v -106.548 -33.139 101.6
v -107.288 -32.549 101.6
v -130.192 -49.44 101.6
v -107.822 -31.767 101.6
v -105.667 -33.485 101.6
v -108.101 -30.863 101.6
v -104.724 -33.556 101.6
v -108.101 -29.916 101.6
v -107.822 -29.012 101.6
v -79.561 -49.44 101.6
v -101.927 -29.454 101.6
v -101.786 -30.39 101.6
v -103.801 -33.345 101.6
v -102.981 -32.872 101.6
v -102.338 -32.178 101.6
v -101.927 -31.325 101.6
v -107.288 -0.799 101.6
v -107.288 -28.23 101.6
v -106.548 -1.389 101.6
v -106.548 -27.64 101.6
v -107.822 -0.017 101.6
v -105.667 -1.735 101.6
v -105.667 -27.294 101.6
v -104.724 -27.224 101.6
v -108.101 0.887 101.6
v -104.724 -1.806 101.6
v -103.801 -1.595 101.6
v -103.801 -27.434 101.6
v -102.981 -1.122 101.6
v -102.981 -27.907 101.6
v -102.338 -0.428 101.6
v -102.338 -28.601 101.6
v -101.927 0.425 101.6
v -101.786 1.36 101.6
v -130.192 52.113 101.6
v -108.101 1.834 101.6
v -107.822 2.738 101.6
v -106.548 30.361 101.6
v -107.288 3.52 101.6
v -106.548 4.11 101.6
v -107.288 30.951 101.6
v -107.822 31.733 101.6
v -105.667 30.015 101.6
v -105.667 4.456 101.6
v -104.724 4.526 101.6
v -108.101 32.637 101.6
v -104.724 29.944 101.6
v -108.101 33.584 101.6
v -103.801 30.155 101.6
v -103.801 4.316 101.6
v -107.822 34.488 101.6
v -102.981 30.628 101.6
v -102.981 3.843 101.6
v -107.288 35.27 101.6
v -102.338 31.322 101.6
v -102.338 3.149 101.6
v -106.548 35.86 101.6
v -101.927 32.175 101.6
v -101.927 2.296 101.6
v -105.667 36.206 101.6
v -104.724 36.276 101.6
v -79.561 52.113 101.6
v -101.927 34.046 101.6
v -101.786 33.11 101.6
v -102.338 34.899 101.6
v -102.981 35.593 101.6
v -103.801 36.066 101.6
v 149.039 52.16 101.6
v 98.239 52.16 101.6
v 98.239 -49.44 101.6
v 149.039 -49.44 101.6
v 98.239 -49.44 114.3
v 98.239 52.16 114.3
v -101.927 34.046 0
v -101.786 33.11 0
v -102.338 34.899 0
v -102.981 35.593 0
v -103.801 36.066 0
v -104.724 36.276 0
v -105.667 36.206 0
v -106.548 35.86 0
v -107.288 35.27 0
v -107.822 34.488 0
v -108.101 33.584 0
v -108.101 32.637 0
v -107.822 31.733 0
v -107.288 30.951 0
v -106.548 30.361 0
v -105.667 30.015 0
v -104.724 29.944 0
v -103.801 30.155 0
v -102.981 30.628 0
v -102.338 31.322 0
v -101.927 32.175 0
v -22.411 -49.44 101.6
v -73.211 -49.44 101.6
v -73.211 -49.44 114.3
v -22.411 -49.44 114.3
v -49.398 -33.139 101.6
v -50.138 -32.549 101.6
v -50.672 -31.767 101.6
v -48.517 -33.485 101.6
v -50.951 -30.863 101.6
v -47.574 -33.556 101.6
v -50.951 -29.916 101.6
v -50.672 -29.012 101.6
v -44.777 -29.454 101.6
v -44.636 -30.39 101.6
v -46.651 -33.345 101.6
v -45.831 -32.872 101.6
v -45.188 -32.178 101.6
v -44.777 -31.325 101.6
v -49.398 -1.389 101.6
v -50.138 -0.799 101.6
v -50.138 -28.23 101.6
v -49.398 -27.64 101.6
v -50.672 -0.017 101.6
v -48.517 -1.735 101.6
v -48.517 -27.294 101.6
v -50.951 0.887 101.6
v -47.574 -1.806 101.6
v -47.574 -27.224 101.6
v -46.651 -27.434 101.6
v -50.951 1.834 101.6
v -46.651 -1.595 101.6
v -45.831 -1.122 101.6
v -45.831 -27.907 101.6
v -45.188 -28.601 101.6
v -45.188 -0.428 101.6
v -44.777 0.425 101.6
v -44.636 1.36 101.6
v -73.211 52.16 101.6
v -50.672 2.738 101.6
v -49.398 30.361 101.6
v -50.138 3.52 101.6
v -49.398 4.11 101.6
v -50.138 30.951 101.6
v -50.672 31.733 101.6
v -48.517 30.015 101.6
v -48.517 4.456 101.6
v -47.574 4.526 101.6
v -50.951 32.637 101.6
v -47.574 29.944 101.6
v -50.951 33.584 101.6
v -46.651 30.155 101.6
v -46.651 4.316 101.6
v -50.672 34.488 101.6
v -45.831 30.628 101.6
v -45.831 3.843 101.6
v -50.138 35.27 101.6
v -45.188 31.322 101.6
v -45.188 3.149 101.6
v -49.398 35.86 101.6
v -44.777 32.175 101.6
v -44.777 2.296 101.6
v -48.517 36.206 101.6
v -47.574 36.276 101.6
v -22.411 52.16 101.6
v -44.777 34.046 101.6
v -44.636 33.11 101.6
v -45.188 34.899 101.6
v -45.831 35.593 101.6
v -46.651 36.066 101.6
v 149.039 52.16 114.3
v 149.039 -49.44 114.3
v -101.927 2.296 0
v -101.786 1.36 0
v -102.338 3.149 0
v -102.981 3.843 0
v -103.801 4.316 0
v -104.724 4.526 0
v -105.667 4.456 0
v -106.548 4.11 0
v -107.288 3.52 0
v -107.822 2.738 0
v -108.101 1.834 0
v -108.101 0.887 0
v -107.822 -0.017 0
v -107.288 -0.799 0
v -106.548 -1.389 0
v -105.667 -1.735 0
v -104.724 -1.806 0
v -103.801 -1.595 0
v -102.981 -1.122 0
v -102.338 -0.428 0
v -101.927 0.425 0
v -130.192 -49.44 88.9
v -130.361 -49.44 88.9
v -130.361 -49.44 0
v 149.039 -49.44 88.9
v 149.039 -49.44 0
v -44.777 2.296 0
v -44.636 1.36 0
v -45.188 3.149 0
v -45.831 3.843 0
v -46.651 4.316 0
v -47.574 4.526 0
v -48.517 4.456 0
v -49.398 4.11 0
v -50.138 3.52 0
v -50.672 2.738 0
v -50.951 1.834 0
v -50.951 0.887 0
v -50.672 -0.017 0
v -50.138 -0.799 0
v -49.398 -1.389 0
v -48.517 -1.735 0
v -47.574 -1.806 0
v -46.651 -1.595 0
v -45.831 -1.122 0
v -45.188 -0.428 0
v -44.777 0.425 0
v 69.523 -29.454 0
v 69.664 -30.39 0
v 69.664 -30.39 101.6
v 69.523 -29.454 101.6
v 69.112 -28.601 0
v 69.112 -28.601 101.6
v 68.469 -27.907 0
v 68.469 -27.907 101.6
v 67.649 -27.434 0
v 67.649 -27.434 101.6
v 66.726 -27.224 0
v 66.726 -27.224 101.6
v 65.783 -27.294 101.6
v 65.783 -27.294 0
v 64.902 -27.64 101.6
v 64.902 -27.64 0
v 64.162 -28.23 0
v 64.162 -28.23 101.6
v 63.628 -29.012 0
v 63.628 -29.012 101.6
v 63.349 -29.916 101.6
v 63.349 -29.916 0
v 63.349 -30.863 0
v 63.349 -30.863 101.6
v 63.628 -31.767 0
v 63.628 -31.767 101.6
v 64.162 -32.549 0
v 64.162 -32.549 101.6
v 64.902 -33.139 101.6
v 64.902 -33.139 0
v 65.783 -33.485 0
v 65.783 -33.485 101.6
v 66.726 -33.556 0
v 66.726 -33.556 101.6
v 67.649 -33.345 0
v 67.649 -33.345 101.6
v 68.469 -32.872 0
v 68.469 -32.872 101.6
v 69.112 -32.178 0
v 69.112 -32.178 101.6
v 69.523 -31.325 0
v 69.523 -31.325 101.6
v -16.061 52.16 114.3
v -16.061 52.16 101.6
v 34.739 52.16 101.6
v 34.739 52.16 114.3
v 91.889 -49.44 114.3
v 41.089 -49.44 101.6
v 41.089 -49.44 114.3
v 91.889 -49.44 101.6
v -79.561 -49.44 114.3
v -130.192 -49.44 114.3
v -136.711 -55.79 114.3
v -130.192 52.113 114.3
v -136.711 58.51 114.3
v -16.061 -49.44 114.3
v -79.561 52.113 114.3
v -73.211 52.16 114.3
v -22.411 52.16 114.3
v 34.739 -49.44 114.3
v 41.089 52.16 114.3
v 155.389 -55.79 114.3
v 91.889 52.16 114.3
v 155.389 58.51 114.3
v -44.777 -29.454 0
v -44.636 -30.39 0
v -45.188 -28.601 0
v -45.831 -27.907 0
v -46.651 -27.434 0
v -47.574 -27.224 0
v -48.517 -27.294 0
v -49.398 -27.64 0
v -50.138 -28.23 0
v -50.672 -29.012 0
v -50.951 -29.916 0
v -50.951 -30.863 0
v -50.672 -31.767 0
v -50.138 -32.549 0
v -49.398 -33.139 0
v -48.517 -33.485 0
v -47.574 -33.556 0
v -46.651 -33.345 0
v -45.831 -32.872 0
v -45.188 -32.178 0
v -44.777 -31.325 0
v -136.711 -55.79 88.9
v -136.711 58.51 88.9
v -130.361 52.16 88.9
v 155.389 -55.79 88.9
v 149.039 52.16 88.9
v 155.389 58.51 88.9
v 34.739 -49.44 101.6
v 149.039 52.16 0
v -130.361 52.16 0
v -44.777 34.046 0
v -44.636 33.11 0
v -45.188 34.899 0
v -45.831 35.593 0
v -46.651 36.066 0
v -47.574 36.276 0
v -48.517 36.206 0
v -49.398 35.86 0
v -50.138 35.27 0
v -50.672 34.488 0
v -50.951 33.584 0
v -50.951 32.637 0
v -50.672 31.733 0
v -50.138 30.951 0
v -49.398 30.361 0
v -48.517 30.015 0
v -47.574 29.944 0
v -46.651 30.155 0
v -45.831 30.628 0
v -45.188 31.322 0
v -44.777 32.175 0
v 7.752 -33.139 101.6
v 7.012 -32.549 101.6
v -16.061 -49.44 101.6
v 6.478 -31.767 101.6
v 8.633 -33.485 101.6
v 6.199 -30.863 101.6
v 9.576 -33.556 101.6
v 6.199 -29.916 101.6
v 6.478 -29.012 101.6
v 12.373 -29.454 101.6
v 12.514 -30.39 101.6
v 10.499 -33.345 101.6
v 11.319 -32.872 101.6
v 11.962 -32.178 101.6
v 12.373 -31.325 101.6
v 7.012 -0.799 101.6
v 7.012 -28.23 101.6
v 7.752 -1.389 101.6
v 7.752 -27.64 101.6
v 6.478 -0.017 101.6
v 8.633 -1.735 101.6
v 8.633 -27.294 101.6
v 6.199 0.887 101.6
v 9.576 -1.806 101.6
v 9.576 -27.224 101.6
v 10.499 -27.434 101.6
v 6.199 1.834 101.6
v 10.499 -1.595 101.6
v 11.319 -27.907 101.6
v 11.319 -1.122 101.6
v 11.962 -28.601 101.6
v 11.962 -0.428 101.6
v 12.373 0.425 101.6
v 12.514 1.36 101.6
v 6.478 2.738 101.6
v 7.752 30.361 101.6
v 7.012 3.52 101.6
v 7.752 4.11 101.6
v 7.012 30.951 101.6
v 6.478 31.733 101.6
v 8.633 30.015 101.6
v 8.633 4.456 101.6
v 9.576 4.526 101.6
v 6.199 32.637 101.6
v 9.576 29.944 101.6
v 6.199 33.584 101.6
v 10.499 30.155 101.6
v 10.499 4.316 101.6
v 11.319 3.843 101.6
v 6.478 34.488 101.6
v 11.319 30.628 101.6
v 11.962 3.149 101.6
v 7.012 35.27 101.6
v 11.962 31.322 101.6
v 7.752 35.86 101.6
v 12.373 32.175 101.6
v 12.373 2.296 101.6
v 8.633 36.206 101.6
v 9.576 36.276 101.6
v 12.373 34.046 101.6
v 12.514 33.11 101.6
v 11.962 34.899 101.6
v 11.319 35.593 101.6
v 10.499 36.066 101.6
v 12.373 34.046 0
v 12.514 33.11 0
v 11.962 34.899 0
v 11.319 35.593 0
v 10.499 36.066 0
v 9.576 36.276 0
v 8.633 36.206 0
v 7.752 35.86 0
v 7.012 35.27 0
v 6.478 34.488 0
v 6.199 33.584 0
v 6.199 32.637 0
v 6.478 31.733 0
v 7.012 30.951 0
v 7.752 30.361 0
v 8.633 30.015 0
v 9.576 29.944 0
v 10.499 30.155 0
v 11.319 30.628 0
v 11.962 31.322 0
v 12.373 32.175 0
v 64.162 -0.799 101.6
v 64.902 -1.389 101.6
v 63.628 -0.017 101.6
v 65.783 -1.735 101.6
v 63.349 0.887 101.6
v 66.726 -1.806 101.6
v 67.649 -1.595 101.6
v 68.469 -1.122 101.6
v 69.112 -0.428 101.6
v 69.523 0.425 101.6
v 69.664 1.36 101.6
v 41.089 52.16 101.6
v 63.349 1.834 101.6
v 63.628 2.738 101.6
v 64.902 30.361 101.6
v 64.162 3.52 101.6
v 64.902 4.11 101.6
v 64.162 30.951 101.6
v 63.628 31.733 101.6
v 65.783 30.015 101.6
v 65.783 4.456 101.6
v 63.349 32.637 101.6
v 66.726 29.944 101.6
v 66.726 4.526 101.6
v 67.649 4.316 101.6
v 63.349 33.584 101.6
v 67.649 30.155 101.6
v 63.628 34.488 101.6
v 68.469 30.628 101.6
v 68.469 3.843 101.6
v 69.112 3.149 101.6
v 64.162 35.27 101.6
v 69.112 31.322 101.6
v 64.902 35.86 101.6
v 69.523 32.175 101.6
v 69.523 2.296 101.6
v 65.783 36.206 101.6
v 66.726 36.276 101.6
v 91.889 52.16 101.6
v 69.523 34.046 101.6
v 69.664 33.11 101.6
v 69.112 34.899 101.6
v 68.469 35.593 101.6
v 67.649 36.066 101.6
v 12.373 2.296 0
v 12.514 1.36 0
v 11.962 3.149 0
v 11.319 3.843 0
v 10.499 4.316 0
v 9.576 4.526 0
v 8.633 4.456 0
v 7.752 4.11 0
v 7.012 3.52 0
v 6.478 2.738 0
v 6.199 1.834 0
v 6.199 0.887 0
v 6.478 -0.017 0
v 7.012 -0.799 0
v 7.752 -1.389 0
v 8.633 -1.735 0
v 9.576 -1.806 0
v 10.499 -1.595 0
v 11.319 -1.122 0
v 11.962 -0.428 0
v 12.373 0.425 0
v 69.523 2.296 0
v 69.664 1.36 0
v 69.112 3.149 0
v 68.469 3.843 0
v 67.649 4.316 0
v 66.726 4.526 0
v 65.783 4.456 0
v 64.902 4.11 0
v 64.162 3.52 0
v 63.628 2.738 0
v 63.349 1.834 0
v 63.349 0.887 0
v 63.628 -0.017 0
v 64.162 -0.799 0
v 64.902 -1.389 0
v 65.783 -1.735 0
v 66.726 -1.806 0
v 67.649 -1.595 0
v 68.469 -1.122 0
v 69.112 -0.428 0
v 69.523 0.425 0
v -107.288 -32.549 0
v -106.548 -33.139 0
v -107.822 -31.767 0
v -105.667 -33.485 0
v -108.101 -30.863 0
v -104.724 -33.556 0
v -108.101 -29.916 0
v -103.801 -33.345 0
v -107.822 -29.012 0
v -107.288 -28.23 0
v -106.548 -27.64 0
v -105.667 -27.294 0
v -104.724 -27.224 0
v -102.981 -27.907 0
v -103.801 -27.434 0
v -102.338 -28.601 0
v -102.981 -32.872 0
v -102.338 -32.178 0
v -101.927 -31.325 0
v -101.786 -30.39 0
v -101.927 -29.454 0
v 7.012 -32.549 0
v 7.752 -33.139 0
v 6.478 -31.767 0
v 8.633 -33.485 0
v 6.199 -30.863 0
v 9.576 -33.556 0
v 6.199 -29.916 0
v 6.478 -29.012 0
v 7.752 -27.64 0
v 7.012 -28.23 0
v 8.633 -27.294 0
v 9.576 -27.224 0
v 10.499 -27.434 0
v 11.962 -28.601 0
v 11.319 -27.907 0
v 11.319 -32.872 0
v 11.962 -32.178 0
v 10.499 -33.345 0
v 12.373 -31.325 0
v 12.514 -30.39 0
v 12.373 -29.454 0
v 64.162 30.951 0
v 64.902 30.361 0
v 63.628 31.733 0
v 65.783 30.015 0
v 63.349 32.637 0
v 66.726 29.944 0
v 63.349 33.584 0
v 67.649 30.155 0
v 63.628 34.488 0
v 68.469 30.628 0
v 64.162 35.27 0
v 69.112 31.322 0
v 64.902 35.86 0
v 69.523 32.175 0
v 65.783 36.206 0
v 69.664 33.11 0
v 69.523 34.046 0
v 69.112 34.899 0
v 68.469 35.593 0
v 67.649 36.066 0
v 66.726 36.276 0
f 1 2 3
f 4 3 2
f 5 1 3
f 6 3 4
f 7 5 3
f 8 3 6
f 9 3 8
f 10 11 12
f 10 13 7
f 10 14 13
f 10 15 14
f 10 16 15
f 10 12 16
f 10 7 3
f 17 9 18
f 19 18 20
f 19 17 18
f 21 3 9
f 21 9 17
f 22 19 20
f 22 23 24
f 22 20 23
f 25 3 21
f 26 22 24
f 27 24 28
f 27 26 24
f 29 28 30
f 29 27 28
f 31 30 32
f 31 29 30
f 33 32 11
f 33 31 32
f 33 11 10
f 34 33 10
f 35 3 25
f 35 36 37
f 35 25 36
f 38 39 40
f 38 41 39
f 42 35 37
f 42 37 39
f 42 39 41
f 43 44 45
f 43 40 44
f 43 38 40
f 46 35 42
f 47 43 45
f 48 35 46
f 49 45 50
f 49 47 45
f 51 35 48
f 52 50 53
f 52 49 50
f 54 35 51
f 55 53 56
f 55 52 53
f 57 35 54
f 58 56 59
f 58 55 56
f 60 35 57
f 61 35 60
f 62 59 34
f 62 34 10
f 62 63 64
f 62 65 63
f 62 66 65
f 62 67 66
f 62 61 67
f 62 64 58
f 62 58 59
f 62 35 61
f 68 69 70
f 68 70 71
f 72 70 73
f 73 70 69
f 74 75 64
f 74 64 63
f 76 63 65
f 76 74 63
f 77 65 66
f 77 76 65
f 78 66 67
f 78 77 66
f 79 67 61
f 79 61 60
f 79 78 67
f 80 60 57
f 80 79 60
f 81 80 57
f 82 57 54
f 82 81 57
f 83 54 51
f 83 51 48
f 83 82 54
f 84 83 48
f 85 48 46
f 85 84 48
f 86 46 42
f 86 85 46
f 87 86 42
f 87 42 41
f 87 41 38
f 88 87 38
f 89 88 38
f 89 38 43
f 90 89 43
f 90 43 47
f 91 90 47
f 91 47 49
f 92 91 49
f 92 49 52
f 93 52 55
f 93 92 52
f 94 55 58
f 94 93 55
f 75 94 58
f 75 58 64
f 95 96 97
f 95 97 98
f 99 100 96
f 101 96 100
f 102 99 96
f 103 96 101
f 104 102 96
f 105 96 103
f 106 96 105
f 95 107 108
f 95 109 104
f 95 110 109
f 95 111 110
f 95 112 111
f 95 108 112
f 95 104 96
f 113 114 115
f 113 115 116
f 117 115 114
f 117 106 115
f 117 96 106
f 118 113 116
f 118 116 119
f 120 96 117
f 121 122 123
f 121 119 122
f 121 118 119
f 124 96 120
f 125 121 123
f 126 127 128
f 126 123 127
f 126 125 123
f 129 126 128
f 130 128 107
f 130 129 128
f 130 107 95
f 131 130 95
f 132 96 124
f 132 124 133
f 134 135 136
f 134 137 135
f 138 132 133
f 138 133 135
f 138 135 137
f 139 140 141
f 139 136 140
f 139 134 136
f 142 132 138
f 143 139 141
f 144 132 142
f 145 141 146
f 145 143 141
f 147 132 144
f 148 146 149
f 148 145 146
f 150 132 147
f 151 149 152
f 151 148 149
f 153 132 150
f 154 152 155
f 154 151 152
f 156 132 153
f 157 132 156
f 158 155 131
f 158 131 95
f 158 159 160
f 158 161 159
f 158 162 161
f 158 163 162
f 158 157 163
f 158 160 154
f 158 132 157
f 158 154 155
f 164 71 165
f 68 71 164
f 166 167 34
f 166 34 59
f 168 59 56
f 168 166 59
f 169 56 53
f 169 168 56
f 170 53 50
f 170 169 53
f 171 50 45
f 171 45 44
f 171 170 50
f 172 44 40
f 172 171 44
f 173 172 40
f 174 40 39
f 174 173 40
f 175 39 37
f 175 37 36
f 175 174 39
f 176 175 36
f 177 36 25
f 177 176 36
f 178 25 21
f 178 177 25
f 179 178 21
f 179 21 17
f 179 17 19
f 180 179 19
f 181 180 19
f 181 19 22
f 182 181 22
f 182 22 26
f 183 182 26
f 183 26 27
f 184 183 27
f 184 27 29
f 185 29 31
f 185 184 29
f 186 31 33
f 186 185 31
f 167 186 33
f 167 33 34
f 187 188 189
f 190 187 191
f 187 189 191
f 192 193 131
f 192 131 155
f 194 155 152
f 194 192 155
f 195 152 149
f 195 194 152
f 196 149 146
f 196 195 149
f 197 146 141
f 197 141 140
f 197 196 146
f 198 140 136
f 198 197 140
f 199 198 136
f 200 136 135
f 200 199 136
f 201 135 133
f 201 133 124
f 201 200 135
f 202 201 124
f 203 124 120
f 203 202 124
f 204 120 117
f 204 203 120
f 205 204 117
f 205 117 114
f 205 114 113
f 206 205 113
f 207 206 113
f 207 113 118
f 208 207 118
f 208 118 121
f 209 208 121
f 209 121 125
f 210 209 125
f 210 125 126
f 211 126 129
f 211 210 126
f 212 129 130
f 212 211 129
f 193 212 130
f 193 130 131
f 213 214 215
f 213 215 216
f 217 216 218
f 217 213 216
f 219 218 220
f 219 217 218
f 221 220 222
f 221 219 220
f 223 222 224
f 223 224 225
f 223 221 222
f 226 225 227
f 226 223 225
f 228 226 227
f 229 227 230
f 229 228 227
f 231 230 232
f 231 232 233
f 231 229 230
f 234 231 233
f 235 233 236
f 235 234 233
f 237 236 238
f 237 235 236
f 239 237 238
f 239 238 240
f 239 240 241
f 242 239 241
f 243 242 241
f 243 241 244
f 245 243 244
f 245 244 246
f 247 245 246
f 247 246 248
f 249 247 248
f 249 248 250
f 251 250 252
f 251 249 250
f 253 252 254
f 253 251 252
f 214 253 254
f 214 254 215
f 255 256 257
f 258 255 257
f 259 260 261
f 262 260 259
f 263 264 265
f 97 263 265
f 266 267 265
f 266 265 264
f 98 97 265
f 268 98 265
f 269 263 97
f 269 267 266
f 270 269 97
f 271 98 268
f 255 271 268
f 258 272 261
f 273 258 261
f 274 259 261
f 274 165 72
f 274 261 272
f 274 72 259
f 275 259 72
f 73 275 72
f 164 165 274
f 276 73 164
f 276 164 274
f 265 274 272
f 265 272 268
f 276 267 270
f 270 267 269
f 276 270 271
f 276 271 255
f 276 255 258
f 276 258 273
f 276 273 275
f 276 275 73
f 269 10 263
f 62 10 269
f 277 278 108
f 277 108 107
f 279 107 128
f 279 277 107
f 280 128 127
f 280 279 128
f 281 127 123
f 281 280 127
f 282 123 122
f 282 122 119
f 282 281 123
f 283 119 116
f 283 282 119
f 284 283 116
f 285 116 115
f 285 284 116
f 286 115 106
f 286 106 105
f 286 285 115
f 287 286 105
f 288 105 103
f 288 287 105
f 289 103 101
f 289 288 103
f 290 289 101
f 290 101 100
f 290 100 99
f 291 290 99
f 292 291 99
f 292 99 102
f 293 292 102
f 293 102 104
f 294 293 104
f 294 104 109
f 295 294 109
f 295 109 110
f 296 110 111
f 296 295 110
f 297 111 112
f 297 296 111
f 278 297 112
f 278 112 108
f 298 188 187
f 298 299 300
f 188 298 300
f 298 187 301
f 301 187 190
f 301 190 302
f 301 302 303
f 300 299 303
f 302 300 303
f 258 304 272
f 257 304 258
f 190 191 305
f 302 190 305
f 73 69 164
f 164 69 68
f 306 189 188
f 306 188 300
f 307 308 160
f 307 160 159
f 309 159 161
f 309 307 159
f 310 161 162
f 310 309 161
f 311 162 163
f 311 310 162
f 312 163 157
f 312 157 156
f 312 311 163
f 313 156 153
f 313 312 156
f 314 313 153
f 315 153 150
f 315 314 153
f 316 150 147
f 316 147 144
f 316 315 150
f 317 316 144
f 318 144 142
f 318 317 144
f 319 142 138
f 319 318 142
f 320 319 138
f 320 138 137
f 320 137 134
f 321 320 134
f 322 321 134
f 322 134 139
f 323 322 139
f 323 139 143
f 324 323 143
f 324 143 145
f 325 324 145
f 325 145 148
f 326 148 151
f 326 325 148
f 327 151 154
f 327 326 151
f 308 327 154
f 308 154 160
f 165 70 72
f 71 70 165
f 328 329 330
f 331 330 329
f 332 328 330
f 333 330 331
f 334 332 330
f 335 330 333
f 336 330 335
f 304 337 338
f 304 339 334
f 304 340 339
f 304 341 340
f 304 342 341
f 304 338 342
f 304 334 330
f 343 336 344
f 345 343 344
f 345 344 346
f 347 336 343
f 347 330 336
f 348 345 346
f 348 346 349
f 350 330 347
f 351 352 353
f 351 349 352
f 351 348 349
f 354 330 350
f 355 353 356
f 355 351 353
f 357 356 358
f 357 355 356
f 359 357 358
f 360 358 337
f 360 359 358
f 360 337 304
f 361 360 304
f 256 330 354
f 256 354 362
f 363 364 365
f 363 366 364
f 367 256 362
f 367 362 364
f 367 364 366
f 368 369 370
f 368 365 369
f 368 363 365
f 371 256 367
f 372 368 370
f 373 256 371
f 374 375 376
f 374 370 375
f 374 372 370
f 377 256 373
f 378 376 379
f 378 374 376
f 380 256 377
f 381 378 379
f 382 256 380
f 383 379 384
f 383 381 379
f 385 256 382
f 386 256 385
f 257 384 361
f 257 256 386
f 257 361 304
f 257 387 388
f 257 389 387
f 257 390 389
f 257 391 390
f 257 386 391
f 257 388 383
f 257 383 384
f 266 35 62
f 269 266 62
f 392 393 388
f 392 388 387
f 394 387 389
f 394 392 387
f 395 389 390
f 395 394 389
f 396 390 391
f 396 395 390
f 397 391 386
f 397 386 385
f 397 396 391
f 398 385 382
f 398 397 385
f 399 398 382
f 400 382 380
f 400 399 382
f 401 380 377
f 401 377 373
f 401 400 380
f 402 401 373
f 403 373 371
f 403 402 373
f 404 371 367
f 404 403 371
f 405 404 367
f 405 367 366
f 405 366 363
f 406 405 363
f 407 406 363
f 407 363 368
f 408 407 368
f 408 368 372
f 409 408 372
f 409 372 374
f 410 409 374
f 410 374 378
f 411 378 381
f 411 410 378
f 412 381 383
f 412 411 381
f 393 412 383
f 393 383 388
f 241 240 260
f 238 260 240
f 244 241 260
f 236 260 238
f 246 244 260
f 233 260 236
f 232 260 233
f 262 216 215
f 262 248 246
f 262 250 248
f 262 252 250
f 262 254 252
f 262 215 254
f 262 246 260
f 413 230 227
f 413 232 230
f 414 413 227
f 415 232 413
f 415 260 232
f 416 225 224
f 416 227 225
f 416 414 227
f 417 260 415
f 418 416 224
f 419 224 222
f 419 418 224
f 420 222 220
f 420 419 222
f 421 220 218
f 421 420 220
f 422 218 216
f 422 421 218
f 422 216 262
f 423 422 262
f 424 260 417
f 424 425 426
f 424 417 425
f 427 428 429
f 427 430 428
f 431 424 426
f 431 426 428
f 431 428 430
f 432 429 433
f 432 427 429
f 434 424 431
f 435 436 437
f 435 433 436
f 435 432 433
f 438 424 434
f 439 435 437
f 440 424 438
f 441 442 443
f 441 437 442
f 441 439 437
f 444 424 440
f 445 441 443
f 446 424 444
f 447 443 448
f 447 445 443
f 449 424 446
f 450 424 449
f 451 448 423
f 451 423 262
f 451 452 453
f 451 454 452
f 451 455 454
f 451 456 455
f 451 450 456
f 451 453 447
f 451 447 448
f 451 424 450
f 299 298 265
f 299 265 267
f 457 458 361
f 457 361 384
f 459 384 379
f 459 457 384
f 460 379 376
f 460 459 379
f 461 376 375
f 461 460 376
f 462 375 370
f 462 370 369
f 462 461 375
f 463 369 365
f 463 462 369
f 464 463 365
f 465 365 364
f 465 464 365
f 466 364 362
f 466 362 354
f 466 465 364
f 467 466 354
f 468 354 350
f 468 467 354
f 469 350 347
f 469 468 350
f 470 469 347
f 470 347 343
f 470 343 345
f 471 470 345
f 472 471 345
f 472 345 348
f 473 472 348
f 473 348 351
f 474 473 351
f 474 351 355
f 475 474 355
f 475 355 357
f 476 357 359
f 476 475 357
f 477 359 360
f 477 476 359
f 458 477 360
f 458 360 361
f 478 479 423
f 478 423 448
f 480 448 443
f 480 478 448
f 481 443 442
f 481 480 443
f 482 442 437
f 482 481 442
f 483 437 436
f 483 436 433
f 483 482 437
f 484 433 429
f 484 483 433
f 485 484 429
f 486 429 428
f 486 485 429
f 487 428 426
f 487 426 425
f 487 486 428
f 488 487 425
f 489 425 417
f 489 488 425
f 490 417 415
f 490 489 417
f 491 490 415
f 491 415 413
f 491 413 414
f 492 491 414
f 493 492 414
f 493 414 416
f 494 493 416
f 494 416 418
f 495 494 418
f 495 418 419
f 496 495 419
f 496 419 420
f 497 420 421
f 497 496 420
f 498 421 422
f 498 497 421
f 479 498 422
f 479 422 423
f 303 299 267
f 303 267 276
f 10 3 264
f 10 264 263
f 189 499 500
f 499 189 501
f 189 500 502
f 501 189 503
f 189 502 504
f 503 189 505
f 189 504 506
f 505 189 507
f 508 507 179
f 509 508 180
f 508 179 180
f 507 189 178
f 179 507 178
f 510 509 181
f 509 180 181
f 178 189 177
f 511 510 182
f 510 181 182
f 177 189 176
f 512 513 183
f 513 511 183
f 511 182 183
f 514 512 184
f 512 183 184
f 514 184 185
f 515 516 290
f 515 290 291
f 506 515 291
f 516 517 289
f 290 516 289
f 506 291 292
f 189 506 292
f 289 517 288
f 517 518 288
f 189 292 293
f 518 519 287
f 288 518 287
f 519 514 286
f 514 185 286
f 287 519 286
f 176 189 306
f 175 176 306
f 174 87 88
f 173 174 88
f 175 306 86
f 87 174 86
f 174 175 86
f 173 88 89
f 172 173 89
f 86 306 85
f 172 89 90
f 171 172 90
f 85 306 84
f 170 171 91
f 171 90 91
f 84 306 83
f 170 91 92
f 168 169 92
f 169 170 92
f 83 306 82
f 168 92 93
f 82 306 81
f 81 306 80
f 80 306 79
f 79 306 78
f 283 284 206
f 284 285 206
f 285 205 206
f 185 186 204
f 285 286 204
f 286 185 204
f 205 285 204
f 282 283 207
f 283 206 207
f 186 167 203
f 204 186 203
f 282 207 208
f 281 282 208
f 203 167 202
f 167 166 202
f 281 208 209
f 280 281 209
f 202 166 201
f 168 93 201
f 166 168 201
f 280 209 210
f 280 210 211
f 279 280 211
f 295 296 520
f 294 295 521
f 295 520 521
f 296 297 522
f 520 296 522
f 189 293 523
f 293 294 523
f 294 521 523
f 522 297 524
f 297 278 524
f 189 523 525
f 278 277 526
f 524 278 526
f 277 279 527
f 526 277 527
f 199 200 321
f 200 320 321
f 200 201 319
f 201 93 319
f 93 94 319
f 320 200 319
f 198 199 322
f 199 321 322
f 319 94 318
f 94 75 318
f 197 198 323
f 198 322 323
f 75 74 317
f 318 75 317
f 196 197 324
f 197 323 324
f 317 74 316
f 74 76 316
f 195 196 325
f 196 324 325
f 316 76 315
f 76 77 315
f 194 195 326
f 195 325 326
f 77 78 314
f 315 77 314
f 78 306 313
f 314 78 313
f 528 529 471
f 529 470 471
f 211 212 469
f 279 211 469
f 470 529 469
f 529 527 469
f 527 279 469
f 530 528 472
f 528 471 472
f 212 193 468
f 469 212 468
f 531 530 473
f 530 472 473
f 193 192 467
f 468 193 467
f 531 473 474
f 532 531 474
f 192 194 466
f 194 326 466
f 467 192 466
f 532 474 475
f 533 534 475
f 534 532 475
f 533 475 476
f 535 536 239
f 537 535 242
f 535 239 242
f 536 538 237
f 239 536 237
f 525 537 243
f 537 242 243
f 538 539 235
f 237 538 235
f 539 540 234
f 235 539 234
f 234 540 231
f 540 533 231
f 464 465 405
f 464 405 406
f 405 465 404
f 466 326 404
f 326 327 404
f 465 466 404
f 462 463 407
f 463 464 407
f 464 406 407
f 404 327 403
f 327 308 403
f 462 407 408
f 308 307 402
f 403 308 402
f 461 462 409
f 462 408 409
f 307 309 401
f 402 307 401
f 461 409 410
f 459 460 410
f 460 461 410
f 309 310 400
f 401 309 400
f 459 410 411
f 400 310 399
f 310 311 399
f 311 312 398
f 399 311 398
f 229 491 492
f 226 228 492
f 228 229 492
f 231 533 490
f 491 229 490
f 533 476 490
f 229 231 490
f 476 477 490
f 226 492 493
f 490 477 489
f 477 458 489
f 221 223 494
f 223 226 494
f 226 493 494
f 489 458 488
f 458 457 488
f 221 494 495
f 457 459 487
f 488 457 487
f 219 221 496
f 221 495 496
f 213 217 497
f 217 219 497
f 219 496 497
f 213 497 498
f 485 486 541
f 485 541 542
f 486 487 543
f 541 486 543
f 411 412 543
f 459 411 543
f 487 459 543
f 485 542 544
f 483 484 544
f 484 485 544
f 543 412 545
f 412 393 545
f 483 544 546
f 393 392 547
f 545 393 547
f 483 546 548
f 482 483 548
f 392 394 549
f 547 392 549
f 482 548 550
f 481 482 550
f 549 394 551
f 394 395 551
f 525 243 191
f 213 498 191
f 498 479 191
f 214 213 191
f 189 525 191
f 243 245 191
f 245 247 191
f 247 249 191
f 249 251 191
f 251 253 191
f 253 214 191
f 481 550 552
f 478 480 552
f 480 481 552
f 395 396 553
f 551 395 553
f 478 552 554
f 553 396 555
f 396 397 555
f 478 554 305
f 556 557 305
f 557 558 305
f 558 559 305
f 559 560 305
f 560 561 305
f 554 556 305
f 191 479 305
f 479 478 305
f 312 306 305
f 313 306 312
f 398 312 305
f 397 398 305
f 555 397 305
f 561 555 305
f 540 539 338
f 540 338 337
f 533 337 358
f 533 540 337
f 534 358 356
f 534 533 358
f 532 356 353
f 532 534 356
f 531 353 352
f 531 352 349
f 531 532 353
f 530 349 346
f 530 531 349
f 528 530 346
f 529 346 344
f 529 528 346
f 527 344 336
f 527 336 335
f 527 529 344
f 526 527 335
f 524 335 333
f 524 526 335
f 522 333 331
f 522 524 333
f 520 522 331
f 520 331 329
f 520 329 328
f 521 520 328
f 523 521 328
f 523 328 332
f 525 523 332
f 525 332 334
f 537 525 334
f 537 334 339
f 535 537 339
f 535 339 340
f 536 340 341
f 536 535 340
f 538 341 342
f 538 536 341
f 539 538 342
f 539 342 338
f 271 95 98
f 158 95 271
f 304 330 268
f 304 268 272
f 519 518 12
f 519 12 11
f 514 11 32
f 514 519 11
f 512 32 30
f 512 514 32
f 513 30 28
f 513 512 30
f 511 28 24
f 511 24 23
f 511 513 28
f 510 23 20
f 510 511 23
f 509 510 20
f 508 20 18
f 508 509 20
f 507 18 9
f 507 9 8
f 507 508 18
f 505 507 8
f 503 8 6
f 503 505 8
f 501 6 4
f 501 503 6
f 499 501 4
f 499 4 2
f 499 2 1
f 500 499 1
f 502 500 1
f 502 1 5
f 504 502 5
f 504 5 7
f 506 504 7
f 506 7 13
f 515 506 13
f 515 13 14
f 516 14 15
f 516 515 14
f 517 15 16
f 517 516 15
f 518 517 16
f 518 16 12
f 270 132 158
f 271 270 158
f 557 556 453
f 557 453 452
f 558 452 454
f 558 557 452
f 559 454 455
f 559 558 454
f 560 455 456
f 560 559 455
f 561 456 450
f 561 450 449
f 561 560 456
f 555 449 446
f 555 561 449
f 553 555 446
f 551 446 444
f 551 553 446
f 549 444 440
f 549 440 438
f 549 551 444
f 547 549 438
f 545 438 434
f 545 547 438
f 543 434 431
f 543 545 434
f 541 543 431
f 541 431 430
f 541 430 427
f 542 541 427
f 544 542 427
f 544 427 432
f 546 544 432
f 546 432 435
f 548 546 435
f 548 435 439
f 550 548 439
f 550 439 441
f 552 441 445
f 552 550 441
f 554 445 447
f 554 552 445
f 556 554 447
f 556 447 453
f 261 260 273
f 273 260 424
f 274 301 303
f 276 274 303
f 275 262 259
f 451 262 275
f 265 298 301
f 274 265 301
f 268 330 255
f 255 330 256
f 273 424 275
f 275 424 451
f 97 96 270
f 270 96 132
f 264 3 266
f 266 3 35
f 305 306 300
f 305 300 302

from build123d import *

# Parameters (mm, degrees)
F0_W     = 279.4
F0_H     = 101.6
F0_R     = 3.175
F1_DEPTH = 101.6
F2_W     = 6.35
F2_H     = 101.6
F3_DEPTH = 12.7
F4_W     = 292.1
F4_H     = 114.3
F4_W_2   = 50.6314568898
F4_H_2   = 101.5523529232
F4_W_3   = 50.8
F4_H_3   = 101.6
F5_DEPTH = 25.4


with BuildPart() as f1:
    # F0 (on Top) → F1 (new body)
    with BuildSketch(Plane.XY):
        with Locations((9.3390280625, 1.3603759766)):
            Rectangle(F0_W, F0_H)
        with Locations((-104.9609719375, -30.3896240234)):
            Circle(F0_R, mode=Mode.SUBTRACT)
        with Locations((-47.8109719375, -30.3896240234)):
            Circle(F0_R, mode=Mode.SUBTRACT)
        with Locations((9.3390280625, -30.3896240234)):
            Circle(F0_R, mode=Mode.SUBTRACT)
        with Locations((66.4890280625, -30.3896240234)):
            Circle(F0_R, mode=Mode.SUBTRACT)
        with Locations((-104.9609719375, 1.3603759766)):
            Circle(F0_R, mode=Mode.SUBTRACT)
        with Locations((-47.8109719375, 1.3603759766)):
            Circle(F0_R, mode=Mode.SUBTRACT)
        with Locations((-104.9609719375, 33.1103759766)):
            Circle(F0_R, mode=Mode.SUBTRACT)
        with Locations((-47.8109719375, 33.1103759766)):
            Circle(F0_R, mode=Mode.SUBTRACT)
        with Locations((9.3390280625, 1.3603759766)):
            Circle(F0_R, mode=Mode.SUBTRACT)
        with Locations((66.4890280625, 1.3603759766)):
            Circle(F0_R, mode=Mode.SUBTRACT)
        with Locations((9.3390280625, 33.1103759766)):
            Circle(F0_R, mode=Mode.SUBTRACT)
        with Locations((66.4890280625, 33.1103759766)):
            Circle(F0_R, mode=Mode.SUBTRACT)
    extrude(amount=F1_DEPTH)

    # F2 (on face) → F3 (cut)
    with BuildSketch(Plane.XY.offset(101.6)):
        with Locations((-76.3859719375, 1.3603759766)):
            Rectangle(F2_W, F2_H)
        with Locations((-19.2359719375, 1.3603759766)):
            Rectangle(F2_W, F2_H)
        with Locations((37.9140280625, 1.3603759766)):
            Rectangle(F2_W, F2_H)
        with Locations((95.0640280625, 1.3603759766)):
            Rectangle(F2_W, F2_H)
    extrude(amount=-F3_DEPTH, mode=Mode.SUBTRACT)

    # F4 (on face) → F5 (join)
    with BuildSketch(Plane.XY.offset(88.9)):
        with Locations((9.3390280625, 1.3603759766)):
            Rectangle(F4_W, F4_H)
        with Locations((-104.8767003824, 1.3365524381)):
            Rectangle(F4_W_2, F4_H_2, mode=Mode.SUBTRACT)
        with Locations((-47.8109719375, 1.3603759766)):
            Rectangle(F4_W_3, F4_H_3, mode=Mode.SUBTRACT)
        with Locations((9.3390280625, 1.3603759766)):
            Rectangle(F4_W_3, F4_H_3, mode=Mode.SUBTRACT)
        with Locations((66.4890280625, 1.3603759766)):
            Rectangle(F4_W_3, F4_H_3, mode=Mode.SUBTRACT)
        with Locations((123.6390280625, 1.3603759766)):
            Rectangle(F4_W_3, F4_H_3, mode=Mode.SUBTRACT)
    extrude(amount=F5_DEPTH)


solid = f1.part
